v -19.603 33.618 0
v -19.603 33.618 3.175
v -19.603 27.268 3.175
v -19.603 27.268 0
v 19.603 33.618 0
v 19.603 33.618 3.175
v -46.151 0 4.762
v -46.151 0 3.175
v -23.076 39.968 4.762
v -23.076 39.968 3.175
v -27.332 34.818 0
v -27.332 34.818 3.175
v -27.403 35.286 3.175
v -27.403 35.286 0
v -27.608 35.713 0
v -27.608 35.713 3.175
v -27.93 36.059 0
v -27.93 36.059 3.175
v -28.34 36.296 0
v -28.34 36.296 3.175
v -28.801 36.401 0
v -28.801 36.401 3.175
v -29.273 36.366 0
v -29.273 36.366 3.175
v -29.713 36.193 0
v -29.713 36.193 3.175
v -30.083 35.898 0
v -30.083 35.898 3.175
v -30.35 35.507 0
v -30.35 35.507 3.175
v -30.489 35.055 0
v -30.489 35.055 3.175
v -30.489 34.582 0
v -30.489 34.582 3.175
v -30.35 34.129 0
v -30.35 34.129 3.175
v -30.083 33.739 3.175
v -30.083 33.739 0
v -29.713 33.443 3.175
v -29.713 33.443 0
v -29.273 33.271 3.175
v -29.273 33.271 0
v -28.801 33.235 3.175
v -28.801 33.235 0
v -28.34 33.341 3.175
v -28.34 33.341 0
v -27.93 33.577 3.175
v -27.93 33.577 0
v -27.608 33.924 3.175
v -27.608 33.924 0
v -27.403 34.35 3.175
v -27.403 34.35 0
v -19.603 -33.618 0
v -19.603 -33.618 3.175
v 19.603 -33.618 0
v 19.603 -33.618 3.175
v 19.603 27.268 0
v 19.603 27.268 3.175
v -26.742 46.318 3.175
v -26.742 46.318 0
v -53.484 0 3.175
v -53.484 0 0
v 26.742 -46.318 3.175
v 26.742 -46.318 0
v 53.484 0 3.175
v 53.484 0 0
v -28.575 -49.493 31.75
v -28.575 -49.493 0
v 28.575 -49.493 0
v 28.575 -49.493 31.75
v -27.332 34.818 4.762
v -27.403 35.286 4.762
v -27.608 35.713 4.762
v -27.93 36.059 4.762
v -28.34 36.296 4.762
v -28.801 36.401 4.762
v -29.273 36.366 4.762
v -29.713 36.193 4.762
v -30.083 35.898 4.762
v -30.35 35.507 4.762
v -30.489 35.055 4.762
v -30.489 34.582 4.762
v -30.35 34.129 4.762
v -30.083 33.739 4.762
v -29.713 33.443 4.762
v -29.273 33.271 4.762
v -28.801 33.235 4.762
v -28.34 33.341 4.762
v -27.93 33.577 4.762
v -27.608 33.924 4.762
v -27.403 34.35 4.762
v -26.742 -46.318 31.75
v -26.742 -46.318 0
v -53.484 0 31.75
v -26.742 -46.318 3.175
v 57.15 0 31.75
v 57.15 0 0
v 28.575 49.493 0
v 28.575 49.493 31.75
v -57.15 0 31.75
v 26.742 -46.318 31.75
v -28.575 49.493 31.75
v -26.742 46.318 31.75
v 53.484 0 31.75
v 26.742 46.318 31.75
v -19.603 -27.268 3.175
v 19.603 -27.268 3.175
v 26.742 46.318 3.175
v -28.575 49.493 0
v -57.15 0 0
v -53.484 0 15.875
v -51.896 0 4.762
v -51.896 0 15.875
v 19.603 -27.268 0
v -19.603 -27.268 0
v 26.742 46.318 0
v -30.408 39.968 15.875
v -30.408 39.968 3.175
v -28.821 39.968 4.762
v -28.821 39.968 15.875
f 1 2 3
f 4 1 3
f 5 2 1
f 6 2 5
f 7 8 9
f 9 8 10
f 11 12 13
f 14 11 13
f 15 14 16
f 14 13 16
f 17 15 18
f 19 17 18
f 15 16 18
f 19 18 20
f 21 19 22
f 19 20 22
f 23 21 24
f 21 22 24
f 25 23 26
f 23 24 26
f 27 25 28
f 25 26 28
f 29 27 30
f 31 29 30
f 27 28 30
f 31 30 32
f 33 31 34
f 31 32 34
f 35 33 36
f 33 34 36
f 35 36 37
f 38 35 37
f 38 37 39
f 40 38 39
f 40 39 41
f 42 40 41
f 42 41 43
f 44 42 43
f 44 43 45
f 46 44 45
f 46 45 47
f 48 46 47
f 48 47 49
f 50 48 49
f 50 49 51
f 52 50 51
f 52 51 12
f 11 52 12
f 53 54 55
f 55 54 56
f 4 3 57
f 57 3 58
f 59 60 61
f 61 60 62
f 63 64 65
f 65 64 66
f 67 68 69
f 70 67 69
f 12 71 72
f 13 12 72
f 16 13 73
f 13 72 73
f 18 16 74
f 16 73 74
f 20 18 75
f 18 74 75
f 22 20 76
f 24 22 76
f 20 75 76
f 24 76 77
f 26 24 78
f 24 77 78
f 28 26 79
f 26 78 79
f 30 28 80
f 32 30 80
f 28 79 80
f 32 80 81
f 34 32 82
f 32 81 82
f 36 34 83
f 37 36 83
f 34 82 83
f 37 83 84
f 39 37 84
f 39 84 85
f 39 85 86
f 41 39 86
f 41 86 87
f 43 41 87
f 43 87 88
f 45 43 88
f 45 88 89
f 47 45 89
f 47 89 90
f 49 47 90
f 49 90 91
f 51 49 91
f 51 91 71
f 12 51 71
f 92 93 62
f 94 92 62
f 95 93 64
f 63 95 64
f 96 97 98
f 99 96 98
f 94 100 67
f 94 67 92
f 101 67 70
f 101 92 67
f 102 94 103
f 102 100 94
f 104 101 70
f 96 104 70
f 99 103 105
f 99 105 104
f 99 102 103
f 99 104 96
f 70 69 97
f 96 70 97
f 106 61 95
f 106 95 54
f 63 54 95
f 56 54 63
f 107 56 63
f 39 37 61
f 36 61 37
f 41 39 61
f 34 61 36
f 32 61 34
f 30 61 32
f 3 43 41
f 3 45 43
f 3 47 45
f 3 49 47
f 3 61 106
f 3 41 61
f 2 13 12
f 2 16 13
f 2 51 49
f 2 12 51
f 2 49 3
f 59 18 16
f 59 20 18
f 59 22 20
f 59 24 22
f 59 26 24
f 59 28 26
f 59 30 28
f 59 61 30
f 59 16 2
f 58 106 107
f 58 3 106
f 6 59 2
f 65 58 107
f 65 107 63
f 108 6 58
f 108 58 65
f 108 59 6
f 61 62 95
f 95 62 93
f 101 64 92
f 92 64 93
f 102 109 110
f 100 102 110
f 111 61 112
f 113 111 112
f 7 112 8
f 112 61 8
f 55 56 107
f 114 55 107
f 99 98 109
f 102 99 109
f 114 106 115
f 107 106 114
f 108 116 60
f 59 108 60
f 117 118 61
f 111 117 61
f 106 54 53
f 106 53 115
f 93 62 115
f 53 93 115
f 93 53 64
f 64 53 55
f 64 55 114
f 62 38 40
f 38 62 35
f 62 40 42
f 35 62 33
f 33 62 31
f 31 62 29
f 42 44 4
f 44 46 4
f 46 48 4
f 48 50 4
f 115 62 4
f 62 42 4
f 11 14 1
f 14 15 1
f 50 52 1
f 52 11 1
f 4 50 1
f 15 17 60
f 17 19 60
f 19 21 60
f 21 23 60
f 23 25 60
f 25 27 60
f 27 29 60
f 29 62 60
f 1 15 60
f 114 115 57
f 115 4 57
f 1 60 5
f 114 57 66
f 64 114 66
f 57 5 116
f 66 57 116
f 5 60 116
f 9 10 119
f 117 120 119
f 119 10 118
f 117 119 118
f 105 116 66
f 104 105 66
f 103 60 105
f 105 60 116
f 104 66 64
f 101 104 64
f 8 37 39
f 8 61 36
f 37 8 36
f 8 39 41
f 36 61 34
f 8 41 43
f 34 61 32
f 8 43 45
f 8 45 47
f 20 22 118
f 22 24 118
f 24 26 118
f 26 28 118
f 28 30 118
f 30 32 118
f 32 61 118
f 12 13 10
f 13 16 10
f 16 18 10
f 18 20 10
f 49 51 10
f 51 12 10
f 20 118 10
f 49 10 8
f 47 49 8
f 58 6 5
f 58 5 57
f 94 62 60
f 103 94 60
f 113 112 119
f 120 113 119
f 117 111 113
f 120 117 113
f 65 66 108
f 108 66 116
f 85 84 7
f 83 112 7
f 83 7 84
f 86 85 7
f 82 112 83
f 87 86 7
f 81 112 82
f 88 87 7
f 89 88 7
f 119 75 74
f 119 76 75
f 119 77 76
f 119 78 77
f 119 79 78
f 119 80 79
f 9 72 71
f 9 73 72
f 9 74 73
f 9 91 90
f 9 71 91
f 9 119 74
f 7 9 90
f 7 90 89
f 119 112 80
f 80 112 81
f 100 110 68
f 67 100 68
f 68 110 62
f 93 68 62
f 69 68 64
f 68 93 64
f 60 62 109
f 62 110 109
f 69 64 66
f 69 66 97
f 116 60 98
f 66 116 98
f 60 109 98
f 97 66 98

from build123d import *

# Parameters (mm, degrees)
F1_DEPTH = 3.175
F2_W     = 39.2063558102
F2_H     = 6.35
F3_DEPTH = 25.4
F4_DEPTH = 31.75
F6_DEPTH = 12.7
F7_DEPTH = 1.5875
F8_R     = 1.5875
F9_DEPTH = 25.4


# Not quite as in the source:
# - a pattern or mirror of a feature is missing from the dataset's text; its kind, count and spacing are read off the source's solid


with BuildPart() as f1:
    # F0 (on Top) → F1 (new body)
    with BuildSketch(Plane.XY):
        Polygon((-26.7419128953, 46.3183518263), (-53.4838257906, 0), (-26.7419128953, -46.3183518263), (26.7419128953, -46.3183518263), (53.4838257906, 0), (26.7419128953, 46.3183518263), align=None)
    extrude(amount=F1_DEPTH)

    # F2 (on face) → F3 (cut)
    with BuildSketch(Plane.XY.offset(3.175)):
        with Locations((0, -30.4433518263)):
            Rectangle(F2_W, F2_H)
    f3 = extrude(amount=-F3_DEPTH, mode=Mode.SUBTRACT)

    # F3_copies: F3 across plane
    add(f3.mirror(Plane.ZX), mode=Mode.SUBTRACT)


with BuildPart() as f4:
    # F0 (on Top) → F4 (new body)
    with BuildSketch(Plane.XY):
        Polygon((28.575, 49.4933518263), (-28.575, 49.4933518263), (-57.15, 0), (-28.575, -49.4933518263), (28.575, -49.4933518263), (57.15, 0), align=None)
        Polygon((-26.7419128953, -46.3183518263), (-53.4838257906, 0), (-26.7419128953, 46.3183518263), (26.7419128953, 46.3183518263), (53.4838257906, 0), (26.7419128953, -46.3183518263), align=None, mode=Mode.SUBTRACT)
    extrude(amount=F4_DEPTH)


with BuildPart() as f6:
    # F5 (on face) → F6 (new body)
    with BuildSketch(Plane.XY.offset(3.175)):
        Polygon((-51.8963257906, 0), (-28.8205871047, 39.9683518263), (-30.4080871047, 39.9683518263), (-53.4838257906, 0), align=None)
    extrude(amount=F6_DEPTH)

    # F5 (on face) → F7 (join)
    with BuildSketch(Plane.XY.offset(3.175)):
        Polygon((-46.1514773719, 0), (-23.075738686, 39.9683518263), (-28.8205871047, 39.9683518263), (-51.8963257906, 0), align=None)
    extrude(amount=F7_DEPTH)


with BuildPart() as f9_tool:
    # F8 (on face) → F9 (new body)
    with BuildSketch(Plane.XY.offset(4.7625)):
        with Locations((-28.9196960247, 34.8182901413)):
            Circle(F8_R)
    extrude(amount=-F9_DEPTH)


with BuildPart() as f1_1:
    add(f1.part)

    # F9: cut by f9_tool
    add(f9_tool.part, mode=Mode.SUBTRACT)


with BuildPart() as f6_1:
    add(f6.part)

    # F9: cut by f9_tool
    add(f9_tool.part, mode=Mode.SUBTRACT)


solid = Compound([f4.part, f1_1.part, f6_1.part])
